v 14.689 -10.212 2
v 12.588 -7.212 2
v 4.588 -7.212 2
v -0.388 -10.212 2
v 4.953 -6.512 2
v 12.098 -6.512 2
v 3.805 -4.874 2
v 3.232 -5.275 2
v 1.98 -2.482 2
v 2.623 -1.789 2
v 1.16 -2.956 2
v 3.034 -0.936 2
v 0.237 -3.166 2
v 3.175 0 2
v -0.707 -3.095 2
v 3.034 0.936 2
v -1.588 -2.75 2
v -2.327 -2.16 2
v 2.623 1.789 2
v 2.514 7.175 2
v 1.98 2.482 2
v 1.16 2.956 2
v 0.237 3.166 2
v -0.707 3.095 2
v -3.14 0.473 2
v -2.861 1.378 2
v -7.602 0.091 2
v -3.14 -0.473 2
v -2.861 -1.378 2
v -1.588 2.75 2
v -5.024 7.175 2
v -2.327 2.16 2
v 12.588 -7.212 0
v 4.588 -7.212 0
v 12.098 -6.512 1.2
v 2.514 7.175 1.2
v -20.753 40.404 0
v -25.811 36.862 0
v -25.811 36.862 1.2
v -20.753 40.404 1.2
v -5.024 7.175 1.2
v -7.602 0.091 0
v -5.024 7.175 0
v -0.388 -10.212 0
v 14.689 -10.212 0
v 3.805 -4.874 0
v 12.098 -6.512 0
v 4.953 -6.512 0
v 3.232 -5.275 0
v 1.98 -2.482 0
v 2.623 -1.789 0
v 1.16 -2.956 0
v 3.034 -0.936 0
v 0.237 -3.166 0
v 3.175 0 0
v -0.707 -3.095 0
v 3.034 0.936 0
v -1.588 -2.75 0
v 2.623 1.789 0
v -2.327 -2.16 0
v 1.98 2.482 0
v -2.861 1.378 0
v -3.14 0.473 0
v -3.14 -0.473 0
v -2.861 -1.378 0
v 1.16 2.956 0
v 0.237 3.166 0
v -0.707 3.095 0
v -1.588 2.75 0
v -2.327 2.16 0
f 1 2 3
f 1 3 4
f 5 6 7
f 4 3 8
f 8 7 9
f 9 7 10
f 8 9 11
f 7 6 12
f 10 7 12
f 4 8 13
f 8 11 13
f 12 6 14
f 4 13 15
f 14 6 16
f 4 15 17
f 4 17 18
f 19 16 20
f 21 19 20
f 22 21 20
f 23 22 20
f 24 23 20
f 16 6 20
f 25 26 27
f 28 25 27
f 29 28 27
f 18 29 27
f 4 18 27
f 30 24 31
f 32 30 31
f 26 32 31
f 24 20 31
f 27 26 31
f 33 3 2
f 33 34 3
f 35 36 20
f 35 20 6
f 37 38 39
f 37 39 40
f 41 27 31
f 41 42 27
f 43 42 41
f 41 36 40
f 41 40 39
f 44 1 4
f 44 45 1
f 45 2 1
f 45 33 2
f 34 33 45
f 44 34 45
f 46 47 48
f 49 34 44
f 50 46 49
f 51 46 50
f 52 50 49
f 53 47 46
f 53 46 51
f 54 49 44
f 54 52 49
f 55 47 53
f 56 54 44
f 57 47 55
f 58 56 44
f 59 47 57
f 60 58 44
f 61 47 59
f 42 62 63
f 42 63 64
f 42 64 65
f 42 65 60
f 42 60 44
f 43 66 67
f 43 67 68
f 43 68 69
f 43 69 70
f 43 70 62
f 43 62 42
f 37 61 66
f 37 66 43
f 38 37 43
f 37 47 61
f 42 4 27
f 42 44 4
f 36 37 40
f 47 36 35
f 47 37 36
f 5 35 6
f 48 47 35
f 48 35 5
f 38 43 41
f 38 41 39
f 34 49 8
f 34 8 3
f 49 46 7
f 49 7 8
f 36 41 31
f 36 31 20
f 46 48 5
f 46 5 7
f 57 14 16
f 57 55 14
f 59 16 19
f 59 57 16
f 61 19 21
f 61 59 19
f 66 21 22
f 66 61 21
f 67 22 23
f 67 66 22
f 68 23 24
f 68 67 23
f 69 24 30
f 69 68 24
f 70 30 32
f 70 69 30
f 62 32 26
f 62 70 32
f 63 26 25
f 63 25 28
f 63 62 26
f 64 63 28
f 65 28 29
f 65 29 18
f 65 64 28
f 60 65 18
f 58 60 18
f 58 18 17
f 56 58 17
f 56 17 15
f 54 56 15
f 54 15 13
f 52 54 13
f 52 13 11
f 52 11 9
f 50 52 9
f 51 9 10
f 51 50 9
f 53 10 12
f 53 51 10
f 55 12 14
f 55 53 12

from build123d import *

# Parameters (mm, degrees)
SKETCH1_R           = 3.175
BOSS_EXTRUDE1_DEPTH = 1.2
SKETCH2_R           = 3.175
BOSS_EXTRUDE2_DEPTH = 0.8


with BuildPart() as part:
    # Sketch1 → Boss-Extrude1 (new body)
    with BuildSketch(Plane.XY):
        Polygon((-0.387763394, -10.212000445), (-7.602233748, 0.091331011), (-5.023989087, 7.175), (-25.810939636, 36.861841993), (-20.752675762, 40.403676487), (12.098034886, -6.512000445), (4.952577098, -6.512000445), (3.805424226, -4.873696357), (3.232017795, -5.275199862), (4.588180163, -7.212000445), (12.588180163, -7.212000445), (14.688802778, -10.212000445), align=None)
        Circle(SKETCH1_R, mode=Mode.SUBTRACT)
    extrude(amount=BOSS_EXTRUDE1_DEPTH)

    # Sketch2 → Boss-Extrude2 (add)
    with BuildSketch(Plane.XY.offset(1.2)):
        Polygon((-5.023989087, 7.175), (2.514293999, 7.175), (12.098034886, -6.512000445), (4.952577098, -6.512000445), (3.805424226, -4.873696357), (3.232017795, -5.275199862), (4.588180163, -7.212000445), (12.588180163, -7.212000445), (14.688802778, -10.212000445), (-0.387763394, -10.212000445), (-7.602233748, 0.091331011), align=None)
        Circle(SKETCH2_R, mode=Mode.SUBTRACT)
    extrude(amount=BOSS_EXTRUDE2_DEPTH)


solid = part.part
